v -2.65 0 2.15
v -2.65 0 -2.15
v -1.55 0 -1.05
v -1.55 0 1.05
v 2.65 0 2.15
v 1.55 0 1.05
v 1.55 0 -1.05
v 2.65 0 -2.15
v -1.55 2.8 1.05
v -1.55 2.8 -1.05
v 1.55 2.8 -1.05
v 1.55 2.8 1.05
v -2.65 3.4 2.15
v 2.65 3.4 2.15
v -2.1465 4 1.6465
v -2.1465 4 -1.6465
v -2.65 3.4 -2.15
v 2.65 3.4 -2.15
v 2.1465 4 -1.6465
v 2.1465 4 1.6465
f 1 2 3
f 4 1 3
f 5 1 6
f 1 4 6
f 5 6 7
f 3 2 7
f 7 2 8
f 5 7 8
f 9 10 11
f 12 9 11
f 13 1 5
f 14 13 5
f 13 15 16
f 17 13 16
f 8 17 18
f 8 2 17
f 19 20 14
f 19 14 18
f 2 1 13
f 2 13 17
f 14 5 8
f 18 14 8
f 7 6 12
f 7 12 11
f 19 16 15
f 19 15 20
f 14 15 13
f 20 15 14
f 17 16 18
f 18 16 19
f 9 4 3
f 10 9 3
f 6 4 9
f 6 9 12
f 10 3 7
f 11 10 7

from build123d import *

# Parameters (mm, degrees)
SKETCH1_W                = 5.3
SKETCH1_H                = 4.3
SKETCH1_W_2              = 3.1
SKETCH1_H_2              = 2.1
BODY_EXTRUDE_DEPTH       = 2.8
SKETCH2_W                = 5.3
SKETCH2_H                = 4.3
CAP_EXTRUDE_DEPTH        = 1.2
BED_CHAMFER_SIZE         = 0.6
BED_CHAMFER_SIZE2        = 0.503459779
BED_CHAMFER_PART_2_SIZE  = 0.6
BED_CHAMFER_PART_2_SIZE2 = 0.503459779
BED_CHAMFER_PART_3_SIZE  = 0.6
BED_CHAMFER_PART_3_SIZE2 = 0.503459779
BED_CHAMFER_PART_4_SIZE  = 0.6
BED_CHAMFER_PART_4_SIZE2 = 0.503459779


with BuildPart() as part:
    # Sketch1 → Body Extrude (new body)
    with BuildSketch(Plane(origin=(0, 0, 0), x_dir=(1, 0, 0), z_dir=(0, 1, 0))):
        Rectangle(SKETCH1_W, SKETCH1_H)
        Rectangle(SKETCH1_W_2, SKETCH1_H_2, mode=Mode.SUBTRACT)
    extrude(amount=BODY_EXTRUDE_DEPTH)

    # Sketch2 → Cap Extrude (add)
    with BuildSketch(Plane(origin=(0, 2.8, 0), x_dir=(1, 0, 0), z_dir=(0, 1, 0))):
        Rectangle(SKETCH2_W, SKETCH2_H)
    extrude(amount=CAP_EXTRUDE_DEPTH)

    # Bed Chamfer
    bed_chamfer_edges = [part.edges().sort_by_distance(p)[0] for p in [
        (-2.65, 4, 0),
    ]]
    bed_chamfer_side = [part.faces().sort_by_distance(p)[0] for p in [
        (-2.65, 2, 0),
    ]]
    chamfer(bed_chamfer_edges, length=BED_CHAMFER_SIZE, length2=BED_CHAMFER_SIZE2, reference=bed_chamfer_side[0])

    # Bed Chamfer part 2
    bed_chamfer_part_2_edges = [part.edges().sort_by_distance(p)[0] for p in [
        (0, 4, 2.15),
    ]]
    bed_chamfer_part_2_side = [part.faces().sort_by_distance(p)[0] for p in [
        (0, 2, 2.15),
    ]]
    chamfer(bed_chamfer_part_2_edges, length=BED_CHAMFER_PART_2_SIZE, length2=BED_CHAMFER_PART_2_SIZE2, reference=bed_chamfer_part_2_side[0])

    # Bed Chamfer part 3
    bed_chamfer_part_3_edges = [part.edges().sort_by_distance(p)[0] for p in [
        (2.65, 4, 0),
    ]]
    bed_chamfer_part_3_side = [part.faces().sort_by_distance(p)[0] for p in [
        (2.65, 2, 0),
    ]]
    chamfer(bed_chamfer_part_3_edges, length=BED_CHAMFER_PART_3_SIZE, length2=BED_CHAMFER_PART_3_SIZE2, reference=bed_chamfer_part_3_side[0])

    # Bed Chamfer part 4
    bed_chamfer_part_4_edges = [part.edges().sort_by_distance(p)[0] for p in [
        (0, 4, -2.15),
    ]]
    bed_chamfer_part_4_side = [part.faces().sort_by_distance(p)[0] for p in [
        (0, 2, -2.15),
    ]]
    chamfer(bed_chamfer_part_4_edges, length=BED_CHAMFER_PART_4_SIZE, length2=BED_CHAMFER_PART_4_SIZE2, reference=bed_chamfer_part_4_side[0])


solid = part.part
